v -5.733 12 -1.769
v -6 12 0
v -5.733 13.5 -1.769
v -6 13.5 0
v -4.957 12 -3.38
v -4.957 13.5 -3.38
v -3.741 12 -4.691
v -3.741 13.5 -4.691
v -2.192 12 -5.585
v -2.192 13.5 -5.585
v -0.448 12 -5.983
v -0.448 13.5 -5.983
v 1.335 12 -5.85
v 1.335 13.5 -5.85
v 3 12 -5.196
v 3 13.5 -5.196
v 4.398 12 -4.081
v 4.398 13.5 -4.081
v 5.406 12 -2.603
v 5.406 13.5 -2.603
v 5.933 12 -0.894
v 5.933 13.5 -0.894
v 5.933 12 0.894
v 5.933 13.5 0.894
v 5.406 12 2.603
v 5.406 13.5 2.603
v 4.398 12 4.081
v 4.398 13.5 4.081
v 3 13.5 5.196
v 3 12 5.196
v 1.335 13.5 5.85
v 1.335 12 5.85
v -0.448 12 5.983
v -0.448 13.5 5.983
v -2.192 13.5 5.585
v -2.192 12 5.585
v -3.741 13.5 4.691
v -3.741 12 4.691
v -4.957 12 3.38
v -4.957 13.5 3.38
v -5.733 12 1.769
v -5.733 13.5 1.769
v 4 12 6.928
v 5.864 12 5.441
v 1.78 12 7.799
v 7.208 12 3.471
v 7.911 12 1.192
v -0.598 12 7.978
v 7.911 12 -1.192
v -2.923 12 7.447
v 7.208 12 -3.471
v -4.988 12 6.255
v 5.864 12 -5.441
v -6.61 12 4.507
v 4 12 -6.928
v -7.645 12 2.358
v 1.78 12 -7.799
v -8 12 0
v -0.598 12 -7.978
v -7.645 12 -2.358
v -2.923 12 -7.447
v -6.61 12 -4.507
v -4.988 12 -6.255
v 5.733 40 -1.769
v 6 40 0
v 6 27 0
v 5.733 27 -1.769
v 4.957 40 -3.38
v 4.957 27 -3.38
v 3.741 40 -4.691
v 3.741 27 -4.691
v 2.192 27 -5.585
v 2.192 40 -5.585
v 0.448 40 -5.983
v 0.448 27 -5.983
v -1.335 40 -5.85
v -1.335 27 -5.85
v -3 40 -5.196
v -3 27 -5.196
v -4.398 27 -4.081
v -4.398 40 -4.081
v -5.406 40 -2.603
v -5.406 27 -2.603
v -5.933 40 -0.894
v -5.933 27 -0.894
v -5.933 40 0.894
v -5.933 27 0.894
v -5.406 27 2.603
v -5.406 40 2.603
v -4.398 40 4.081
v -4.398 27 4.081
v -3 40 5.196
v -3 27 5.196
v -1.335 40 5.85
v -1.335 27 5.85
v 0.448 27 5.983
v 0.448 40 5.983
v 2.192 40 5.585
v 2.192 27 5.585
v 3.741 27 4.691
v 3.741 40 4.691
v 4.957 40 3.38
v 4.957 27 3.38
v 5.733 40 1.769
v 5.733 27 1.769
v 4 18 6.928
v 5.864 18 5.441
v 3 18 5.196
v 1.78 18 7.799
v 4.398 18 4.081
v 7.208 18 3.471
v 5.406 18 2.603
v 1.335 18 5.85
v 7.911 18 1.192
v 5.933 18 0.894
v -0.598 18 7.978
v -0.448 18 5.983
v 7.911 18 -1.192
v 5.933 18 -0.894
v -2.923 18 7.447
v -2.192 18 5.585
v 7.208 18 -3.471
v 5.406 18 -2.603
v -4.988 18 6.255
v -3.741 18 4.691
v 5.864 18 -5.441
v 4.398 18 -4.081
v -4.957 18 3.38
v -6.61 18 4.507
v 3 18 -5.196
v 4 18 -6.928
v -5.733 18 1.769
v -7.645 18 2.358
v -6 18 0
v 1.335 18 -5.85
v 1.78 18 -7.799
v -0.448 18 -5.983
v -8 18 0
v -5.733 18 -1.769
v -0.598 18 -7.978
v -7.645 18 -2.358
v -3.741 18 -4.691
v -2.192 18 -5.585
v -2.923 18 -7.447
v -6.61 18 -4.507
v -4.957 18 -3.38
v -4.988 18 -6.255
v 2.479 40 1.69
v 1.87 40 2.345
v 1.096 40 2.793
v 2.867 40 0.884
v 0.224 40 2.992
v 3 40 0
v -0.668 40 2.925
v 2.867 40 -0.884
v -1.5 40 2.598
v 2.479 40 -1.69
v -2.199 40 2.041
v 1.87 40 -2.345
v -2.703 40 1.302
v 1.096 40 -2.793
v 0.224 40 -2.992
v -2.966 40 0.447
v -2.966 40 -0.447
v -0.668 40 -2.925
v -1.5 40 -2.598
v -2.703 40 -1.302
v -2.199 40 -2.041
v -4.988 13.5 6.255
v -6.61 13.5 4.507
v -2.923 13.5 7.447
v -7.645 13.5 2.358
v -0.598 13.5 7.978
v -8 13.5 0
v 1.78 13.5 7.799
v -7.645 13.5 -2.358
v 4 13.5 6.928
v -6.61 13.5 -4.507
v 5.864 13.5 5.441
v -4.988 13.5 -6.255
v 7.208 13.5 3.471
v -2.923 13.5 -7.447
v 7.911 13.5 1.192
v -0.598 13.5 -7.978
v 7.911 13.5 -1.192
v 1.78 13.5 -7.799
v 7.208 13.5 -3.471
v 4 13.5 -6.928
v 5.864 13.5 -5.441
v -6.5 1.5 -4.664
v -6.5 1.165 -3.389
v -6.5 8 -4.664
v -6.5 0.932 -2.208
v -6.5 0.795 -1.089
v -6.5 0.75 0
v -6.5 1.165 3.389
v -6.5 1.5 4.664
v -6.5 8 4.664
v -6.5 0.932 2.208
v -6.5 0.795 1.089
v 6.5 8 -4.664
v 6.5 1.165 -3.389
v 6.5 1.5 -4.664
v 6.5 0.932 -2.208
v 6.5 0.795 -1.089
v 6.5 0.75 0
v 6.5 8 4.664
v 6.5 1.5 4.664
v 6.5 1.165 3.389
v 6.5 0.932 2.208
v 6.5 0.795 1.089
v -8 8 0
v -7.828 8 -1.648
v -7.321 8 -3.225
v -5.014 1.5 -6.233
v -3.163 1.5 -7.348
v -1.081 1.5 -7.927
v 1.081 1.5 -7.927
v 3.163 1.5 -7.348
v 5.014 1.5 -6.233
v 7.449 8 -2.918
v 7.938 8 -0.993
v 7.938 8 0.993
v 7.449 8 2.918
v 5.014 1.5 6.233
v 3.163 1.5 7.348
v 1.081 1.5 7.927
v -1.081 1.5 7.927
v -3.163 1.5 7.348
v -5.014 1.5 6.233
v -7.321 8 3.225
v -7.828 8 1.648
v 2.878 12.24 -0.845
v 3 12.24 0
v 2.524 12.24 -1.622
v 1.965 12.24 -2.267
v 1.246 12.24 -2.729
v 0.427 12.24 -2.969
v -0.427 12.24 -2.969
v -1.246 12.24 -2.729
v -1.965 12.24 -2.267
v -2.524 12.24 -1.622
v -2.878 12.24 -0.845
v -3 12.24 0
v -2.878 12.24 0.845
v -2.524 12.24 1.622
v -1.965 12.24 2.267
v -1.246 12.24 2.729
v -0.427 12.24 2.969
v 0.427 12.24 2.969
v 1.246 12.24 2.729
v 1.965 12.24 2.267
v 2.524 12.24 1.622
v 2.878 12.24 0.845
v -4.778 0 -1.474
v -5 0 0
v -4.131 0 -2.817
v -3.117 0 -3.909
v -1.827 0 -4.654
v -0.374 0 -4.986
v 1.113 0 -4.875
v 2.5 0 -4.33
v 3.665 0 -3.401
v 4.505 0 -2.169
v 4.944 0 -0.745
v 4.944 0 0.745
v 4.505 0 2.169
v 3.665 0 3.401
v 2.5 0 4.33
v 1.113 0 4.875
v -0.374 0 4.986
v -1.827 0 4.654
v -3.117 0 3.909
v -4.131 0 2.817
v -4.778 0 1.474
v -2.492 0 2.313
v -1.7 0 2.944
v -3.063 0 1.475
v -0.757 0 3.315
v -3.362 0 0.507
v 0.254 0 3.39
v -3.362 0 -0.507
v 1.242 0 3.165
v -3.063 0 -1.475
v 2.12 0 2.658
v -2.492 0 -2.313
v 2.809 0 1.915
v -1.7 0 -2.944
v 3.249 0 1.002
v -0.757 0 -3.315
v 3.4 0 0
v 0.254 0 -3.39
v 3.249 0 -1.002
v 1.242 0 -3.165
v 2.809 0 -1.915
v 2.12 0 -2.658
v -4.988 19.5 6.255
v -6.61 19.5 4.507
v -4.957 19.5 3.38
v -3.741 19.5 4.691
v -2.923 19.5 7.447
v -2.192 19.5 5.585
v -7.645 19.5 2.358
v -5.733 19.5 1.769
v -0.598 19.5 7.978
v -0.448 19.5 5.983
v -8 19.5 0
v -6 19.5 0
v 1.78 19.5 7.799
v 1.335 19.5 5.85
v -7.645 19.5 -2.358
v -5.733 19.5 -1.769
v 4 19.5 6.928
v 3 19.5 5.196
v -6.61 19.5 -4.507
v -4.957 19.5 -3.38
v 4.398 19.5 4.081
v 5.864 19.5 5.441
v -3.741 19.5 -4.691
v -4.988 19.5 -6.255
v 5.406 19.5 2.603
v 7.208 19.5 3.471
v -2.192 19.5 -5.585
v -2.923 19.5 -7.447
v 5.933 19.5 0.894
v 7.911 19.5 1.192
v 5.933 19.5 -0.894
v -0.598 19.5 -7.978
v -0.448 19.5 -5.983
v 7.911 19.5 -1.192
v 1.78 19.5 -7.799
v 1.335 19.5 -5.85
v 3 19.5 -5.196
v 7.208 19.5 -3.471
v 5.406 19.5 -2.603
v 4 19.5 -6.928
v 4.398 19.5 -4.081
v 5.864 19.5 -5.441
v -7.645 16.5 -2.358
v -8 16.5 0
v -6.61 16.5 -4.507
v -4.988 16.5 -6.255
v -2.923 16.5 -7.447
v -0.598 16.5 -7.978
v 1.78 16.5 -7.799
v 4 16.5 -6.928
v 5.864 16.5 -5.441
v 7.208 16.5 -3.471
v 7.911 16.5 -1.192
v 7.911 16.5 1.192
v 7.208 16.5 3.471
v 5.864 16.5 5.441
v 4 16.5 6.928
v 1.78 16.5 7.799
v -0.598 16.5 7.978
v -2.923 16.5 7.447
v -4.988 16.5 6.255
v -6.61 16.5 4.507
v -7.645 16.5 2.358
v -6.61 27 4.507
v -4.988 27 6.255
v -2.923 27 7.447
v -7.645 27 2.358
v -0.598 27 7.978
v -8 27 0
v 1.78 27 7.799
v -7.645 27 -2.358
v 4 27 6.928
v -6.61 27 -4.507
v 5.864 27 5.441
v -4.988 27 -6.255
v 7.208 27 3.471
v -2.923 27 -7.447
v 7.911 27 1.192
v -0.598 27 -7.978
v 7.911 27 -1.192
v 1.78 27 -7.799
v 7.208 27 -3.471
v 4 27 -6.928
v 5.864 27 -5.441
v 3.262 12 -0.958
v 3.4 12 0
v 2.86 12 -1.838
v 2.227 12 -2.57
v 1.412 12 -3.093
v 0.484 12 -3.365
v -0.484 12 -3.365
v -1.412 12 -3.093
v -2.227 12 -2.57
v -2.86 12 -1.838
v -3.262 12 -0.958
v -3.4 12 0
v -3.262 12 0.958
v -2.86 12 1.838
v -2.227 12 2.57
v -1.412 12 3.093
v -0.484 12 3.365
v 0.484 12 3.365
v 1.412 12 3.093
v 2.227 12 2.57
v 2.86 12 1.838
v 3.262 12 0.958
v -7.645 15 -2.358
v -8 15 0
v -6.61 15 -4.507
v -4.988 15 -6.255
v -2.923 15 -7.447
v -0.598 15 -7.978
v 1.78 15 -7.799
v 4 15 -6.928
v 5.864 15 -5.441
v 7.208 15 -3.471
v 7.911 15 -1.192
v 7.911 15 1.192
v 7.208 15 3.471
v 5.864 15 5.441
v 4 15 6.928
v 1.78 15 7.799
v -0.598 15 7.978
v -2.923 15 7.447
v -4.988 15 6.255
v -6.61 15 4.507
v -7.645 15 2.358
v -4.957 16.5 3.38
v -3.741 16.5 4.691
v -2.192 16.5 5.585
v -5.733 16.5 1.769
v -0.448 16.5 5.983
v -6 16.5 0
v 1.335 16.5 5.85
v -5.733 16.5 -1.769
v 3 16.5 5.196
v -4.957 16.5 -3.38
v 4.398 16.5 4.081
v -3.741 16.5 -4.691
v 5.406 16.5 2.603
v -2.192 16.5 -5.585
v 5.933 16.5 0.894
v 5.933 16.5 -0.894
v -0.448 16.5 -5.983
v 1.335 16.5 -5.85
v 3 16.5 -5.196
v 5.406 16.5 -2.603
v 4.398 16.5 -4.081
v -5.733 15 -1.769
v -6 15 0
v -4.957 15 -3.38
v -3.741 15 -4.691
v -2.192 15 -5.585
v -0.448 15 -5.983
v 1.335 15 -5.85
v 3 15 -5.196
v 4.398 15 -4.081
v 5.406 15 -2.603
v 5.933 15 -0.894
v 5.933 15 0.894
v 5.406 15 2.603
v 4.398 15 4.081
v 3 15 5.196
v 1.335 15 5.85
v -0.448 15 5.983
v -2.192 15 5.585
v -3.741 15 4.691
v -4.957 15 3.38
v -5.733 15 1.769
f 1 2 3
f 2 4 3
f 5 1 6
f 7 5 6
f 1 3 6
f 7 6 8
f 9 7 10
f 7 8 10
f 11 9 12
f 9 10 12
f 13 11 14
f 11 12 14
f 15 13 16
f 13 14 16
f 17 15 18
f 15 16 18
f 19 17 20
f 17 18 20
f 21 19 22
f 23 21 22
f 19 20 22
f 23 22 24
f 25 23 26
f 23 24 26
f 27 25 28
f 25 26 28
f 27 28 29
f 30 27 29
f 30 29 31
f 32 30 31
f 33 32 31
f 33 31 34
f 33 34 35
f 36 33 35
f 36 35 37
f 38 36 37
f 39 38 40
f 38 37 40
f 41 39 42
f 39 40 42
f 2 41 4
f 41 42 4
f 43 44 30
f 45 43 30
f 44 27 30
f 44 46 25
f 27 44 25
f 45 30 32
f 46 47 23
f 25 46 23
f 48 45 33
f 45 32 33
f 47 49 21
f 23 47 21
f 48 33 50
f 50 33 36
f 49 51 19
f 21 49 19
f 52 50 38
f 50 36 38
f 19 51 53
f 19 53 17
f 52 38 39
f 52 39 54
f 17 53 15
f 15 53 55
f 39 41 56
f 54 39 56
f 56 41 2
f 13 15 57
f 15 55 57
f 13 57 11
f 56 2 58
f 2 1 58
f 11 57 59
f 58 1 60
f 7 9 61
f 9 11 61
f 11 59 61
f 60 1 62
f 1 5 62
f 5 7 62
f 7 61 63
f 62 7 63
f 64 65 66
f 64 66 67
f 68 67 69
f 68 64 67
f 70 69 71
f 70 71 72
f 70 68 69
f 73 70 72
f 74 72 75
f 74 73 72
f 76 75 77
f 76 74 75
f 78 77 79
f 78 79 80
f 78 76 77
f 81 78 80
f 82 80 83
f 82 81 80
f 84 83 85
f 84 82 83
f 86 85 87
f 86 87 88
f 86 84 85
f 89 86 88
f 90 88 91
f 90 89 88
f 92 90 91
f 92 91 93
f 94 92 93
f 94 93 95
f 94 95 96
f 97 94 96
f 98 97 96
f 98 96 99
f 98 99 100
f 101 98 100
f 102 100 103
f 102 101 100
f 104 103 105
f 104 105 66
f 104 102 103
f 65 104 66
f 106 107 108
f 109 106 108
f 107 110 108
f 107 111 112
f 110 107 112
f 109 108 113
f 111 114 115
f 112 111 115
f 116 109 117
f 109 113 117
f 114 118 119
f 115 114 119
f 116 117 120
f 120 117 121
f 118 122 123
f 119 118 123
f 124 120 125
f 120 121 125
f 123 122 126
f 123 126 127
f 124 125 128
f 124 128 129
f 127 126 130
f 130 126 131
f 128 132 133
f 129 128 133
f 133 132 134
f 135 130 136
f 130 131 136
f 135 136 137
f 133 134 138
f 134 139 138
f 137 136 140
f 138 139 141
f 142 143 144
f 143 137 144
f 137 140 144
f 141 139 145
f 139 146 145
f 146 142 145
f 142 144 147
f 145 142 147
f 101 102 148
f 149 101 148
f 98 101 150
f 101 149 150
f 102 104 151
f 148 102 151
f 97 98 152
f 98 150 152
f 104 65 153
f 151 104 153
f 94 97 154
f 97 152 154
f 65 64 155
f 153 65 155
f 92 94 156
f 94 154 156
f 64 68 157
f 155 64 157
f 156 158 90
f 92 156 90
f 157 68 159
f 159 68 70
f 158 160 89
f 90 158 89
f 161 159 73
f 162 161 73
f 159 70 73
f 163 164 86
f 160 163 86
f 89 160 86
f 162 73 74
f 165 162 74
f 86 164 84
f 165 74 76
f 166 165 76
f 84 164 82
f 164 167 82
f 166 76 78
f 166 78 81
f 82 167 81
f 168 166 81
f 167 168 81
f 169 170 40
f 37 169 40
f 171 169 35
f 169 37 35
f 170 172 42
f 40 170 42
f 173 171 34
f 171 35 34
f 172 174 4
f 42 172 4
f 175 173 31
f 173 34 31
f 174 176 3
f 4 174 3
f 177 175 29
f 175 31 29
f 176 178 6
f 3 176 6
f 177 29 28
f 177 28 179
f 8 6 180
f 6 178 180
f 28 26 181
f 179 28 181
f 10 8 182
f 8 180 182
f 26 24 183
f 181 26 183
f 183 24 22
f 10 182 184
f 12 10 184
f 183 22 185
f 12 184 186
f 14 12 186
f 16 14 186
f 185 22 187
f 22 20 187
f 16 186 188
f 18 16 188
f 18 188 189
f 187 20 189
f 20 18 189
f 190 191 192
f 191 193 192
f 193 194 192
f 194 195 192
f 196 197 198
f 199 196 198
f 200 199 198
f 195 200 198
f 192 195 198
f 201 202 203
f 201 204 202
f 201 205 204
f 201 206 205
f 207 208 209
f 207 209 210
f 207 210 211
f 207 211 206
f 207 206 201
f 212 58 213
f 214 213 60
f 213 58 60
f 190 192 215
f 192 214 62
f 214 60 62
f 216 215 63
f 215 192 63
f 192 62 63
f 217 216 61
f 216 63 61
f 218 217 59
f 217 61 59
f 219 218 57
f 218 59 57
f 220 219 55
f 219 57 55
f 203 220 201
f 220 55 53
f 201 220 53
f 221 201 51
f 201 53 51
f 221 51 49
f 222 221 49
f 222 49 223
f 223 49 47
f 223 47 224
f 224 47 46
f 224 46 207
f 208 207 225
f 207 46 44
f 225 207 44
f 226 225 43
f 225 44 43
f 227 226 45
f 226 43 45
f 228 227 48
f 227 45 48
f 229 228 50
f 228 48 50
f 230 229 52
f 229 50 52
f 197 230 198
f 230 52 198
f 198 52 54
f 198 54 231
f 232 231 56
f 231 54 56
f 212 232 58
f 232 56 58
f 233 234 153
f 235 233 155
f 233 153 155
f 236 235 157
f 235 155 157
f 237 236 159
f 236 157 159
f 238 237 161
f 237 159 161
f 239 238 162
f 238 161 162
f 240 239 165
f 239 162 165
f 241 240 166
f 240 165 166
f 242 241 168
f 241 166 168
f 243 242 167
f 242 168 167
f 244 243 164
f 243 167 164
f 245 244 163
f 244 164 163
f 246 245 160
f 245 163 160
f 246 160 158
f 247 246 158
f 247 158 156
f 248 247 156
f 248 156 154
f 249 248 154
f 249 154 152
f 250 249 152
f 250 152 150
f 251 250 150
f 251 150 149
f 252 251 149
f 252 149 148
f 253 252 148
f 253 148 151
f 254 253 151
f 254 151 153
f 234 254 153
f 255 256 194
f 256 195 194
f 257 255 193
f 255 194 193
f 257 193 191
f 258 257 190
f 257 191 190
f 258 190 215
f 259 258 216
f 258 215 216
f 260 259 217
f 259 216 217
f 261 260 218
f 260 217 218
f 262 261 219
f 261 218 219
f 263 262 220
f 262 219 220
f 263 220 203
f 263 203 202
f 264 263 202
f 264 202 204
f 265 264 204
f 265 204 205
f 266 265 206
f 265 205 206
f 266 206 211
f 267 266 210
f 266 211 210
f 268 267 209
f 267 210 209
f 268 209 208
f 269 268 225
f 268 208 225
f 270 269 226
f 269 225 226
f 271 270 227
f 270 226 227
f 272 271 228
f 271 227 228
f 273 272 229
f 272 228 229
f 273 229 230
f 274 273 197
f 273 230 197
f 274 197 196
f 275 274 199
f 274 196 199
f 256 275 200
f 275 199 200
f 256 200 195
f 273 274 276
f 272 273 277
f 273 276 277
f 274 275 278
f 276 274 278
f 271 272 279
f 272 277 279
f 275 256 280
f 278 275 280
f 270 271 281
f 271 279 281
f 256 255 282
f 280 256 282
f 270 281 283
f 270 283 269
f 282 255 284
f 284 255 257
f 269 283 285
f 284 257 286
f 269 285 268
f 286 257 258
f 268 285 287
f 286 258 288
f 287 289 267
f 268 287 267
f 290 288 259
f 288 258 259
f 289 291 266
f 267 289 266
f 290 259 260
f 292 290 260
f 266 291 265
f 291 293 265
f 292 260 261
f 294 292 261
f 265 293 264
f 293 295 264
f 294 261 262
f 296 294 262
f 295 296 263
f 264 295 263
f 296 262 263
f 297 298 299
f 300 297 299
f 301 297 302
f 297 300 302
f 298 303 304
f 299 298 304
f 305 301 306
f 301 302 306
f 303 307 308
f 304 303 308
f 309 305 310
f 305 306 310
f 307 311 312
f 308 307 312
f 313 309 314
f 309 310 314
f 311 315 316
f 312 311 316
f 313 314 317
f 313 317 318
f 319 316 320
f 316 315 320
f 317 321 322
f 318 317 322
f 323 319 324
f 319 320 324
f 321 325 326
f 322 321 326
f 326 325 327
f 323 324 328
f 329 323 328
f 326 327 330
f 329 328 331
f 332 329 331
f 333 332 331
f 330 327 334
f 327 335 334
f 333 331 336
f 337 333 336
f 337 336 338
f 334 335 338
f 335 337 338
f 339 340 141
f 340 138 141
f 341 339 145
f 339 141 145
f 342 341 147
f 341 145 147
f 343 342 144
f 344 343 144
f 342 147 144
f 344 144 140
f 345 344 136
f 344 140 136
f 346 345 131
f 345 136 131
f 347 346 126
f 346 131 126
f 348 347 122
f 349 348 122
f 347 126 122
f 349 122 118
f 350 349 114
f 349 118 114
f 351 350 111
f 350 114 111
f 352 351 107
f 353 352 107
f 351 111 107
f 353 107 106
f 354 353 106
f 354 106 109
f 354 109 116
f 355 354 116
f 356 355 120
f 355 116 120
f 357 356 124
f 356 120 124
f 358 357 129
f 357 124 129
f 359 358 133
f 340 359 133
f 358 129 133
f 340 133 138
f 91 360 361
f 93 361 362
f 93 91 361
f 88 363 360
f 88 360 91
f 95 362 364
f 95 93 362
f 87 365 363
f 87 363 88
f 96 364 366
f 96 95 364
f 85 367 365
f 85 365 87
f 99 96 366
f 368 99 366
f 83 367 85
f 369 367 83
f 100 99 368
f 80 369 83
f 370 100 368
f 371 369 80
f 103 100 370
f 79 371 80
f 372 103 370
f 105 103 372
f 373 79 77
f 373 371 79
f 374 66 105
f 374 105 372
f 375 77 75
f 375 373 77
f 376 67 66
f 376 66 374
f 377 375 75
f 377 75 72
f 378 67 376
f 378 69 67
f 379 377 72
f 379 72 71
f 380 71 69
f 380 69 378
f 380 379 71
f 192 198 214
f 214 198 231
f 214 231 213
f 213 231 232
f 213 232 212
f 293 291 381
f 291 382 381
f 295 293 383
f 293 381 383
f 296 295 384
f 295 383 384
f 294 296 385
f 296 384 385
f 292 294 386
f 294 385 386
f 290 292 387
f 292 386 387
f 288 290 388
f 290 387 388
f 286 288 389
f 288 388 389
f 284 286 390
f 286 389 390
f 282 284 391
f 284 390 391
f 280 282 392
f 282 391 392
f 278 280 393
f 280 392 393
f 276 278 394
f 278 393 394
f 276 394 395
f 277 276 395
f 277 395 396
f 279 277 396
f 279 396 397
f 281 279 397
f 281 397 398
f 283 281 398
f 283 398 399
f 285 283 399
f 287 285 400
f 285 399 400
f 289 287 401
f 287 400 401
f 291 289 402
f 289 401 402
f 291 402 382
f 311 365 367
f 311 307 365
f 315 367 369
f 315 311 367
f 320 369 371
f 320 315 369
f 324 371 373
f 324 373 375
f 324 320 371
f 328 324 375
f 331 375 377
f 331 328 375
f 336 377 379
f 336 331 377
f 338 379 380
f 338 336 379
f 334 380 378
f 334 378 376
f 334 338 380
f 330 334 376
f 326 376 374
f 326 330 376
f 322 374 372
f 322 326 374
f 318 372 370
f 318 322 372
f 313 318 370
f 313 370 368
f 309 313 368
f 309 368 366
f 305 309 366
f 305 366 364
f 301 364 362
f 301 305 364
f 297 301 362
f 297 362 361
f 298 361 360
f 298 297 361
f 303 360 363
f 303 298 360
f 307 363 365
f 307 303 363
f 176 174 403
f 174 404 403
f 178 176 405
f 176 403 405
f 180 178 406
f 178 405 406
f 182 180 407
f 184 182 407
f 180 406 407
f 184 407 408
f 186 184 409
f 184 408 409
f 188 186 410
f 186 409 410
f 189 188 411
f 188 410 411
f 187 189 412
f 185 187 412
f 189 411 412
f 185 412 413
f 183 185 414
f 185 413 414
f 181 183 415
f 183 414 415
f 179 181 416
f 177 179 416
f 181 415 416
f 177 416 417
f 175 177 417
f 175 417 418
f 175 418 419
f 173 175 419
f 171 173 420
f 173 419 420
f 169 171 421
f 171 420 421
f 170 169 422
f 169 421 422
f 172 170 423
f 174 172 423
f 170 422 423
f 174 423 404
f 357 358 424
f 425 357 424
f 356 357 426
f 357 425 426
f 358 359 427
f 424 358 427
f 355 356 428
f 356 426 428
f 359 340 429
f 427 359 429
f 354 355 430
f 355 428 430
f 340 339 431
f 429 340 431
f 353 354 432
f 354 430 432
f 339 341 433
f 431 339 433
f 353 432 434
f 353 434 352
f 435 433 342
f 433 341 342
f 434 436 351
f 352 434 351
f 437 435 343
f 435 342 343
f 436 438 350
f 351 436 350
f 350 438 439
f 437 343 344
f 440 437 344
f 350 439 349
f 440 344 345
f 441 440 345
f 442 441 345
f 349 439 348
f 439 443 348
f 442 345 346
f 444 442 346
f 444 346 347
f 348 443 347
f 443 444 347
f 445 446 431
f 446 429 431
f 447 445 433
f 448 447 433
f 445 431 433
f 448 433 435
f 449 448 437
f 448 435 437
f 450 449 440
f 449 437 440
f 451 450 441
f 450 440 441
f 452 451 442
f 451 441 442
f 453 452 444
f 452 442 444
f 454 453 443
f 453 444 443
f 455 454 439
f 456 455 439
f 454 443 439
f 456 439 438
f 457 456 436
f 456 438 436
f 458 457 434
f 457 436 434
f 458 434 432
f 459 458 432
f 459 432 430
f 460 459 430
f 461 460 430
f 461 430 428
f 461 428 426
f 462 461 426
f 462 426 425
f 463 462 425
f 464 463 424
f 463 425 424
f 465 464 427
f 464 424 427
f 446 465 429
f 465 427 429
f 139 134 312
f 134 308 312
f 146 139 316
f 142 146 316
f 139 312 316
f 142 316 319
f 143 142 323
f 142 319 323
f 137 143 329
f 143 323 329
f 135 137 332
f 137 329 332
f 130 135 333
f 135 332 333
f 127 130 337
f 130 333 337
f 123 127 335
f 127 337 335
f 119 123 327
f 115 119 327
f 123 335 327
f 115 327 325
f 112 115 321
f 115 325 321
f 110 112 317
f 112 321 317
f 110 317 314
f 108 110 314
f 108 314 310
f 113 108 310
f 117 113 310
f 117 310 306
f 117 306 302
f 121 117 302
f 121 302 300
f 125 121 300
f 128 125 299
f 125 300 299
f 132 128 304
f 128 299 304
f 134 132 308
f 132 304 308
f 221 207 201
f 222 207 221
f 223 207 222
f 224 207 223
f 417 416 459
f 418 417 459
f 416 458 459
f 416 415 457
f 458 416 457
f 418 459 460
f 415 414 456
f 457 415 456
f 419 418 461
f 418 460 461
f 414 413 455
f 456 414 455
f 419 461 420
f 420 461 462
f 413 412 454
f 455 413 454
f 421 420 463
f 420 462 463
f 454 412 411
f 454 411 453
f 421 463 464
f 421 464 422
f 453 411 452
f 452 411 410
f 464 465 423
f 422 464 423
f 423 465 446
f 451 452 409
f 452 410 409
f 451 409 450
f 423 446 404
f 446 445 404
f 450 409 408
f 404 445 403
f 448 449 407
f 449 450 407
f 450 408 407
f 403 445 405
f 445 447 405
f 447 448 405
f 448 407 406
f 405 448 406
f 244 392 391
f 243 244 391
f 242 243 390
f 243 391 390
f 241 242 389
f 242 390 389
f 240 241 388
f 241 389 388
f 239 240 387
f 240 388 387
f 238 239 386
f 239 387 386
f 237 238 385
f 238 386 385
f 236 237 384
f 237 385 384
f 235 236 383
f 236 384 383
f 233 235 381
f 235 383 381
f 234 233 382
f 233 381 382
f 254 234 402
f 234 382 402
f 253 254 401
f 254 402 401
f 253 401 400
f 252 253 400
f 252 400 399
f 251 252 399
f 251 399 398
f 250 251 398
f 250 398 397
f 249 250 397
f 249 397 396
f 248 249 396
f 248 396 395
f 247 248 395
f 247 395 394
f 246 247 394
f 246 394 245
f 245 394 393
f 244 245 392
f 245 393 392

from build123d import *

# Parameters (mm, degrees)
TAGLIO_ESTRUSIONE1_REACH             = 10
SCHIZZO2_W                           = 1.5
SCHIZZO2_H                           = 8
TAGLIO_ESTRUSIONE1_DIRECTION_2_REACH = 10
SCHIZZO7_R                           = 3
TAGLIO_ESTRUSIONE2_DEPTH             = 41
FORO_FILETTATO_M8_1_D                = 6.8
FORO_FILETTATO_M8_1_DEPTH            = 12
FORO_FILETTATO_M8_1_TIP              = 2.042926105
SCHIZZO10_OUTSIDE_W                  = 27.192
SCHIZZO10_OUTSIDE_H                  = 27.192
SCHIZZO10_OUTSIDE_R                  = 6
TAGLIO_ESTRUSIONE3_DEPTH             = 13


with BuildPart() as part:
    # Schizzo1 → Rivoluzione1 (revolve)
    with BuildSketch(Plane.XY):
        Polygon((0, 0), (-5, 0), (-8, 1.5), (-8, 12), (-6, 12), (-6, 13.5), (-8, 13.5), (-8, 15), (-6, 15), (-6, 16.5), (-8, 16.5), (-8, 18), (-6, 18), (-6, 19.5), (-8, 19.5), (-8, 27), (-8, 40), (0, 40), align=None)
    revolve(axis=Axis((0, 129.407380346, 0), (0, -1, 0)))

    # Schizzo2 → Taglio-Estrusione1 (cut, up to next)
    with BuildSketch(Plane.XY, mode=Mode.PRIVATE) as taglio_estrusione1_sk1:
        with Locations((-7.25, 4)):
            Rectangle(SCHIZZO2_W, SCHIZZO2_H)
    taglio_estrusione1_tool1 = extrude(taglio_estrusione1_sk1.sketch, amount=-TAGLIO_ESTRUSIONE1_REACH, mode=Mode.PRIVATE) & part.part
    add(taglio_estrusione1_tool1.solids().sort_by_distance((-7.25, 4, 0))[0], mode=Mode.SUBTRACT)
    # Schizzo2 → Taglio-Estrusione1 (cut, up to next)
    with BuildSketch(Plane.XY, mode=Mode.PRIVATE) as taglio_estrusione1_sk2:
        with Locations((7.25, 4)):
            Rectangle(SCHIZZO2_W, SCHIZZO2_H)
    taglio_estrusione1_tool2 = extrude(taglio_estrusione1_sk2.sketch, amount=-TAGLIO_ESTRUSIONE1_REACH, mode=Mode.PRIVATE) & part.part
    add(taglio_estrusione1_tool2.solids().sort_by_distance((7.25, 4, 0))[0], mode=Mode.SUBTRACT)

    # Schizzo2 → Taglio-Estrusione1 direction 2 (cut, up to next)
    with BuildSketch(Plane.XY, mode=Mode.PRIVATE) as taglio_estrusione1_direction_2_sk1:
        with Locations((-7.25, 4)):
            Rectangle(SCHIZZO2_W, SCHIZZO2_H)
    taglio_estrusione1_direction_2_tool1 = extrude(taglio_estrusione1_direction_2_sk1.sketch, amount=TAGLIO_ESTRUSIONE1_DIRECTION_2_REACH, mode=Mode.PRIVATE) & part.part
    add(taglio_estrusione1_direction_2_tool1.solids().sort_by_distance((-7.25, 4, 0))[0], mode=Mode.SUBTRACT)
    # Schizzo2 → Taglio-Estrusione1 direction 2 (cut, up to next)
    with BuildSketch(Plane.XY, mode=Mode.PRIVATE) as taglio_estrusione1_direction_2_sk2:
        with Locations((7.25, 4)):
            Rectangle(SCHIZZO2_W, SCHIZZO2_H)
    taglio_estrusione1_direction_2_tool2 = extrude(taglio_estrusione1_direction_2_sk2.sketch, amount=TAGLIO_ESTRUSIONE1_DIRECTION_2_REACH, mode=Mode.PRIVATE) & part.part
    add(taglio_estrusione1_direction_2_tool2.solids().sort_by_distance((7.25, 4, 0))[0], mode=Mode.SUBTRACT)

    # Schizzo7 → Taglio-Estrusione2 (cut, through all)
    with BuildSketch(Plane(origin=(0, 40, 0), x_dir=(1, 0, 0), z_dir=(0, 1, 0))):
        Circle(SCHIZZO7_R)
    extrude(amount=-TAGLIO_ESTRUSIONE2_DEPTH, mode=Mode.SUBTRACT)

    # Foro filettato M8-1
    with Locations(Plane(origin=(0, 0, 0), x_dir=(-1, 0, 0), z_dir=(0, -1, 0))):
        with Locations((0, 0)):
            Hole(FORO_FILETTATO_M8_1_D / 2, depth=FORO_FILETTATO_M8_1_DEPTH)
            with Locations((0, 0, -(FORO_FILETTATO_M8_1_DEPTH + FORO_FILETTATO_M8_1_TIP / 2))):  # 118° drill point
                Cone(0, FORO_FILETTATO_M8_1_D / 2, FORO_FILETTATO_M8_1_TIP, mode=Mode.SUBTRACT)

    # Schizzo10 outside → Taglio-Estrusione3 (cut)
    with BuildSketch(Plane(origin=(0, 40, 0), x_dir=(1, 0, 0), z_dir=(0, 1, 0))):
        Rectangle(SCHIZZO10_OUTSIDE_W, SCHIZZO10_OUTSIDE_H)
        Circle(SCHIZZO10_OUTSIDE_R, mode=Mode.SUBTRACT)
    extrude(amount=-TAGLIO_ESTRUSIONE3_DEPTH, mode=Mode.SUBTRACT)


solid = part.part
